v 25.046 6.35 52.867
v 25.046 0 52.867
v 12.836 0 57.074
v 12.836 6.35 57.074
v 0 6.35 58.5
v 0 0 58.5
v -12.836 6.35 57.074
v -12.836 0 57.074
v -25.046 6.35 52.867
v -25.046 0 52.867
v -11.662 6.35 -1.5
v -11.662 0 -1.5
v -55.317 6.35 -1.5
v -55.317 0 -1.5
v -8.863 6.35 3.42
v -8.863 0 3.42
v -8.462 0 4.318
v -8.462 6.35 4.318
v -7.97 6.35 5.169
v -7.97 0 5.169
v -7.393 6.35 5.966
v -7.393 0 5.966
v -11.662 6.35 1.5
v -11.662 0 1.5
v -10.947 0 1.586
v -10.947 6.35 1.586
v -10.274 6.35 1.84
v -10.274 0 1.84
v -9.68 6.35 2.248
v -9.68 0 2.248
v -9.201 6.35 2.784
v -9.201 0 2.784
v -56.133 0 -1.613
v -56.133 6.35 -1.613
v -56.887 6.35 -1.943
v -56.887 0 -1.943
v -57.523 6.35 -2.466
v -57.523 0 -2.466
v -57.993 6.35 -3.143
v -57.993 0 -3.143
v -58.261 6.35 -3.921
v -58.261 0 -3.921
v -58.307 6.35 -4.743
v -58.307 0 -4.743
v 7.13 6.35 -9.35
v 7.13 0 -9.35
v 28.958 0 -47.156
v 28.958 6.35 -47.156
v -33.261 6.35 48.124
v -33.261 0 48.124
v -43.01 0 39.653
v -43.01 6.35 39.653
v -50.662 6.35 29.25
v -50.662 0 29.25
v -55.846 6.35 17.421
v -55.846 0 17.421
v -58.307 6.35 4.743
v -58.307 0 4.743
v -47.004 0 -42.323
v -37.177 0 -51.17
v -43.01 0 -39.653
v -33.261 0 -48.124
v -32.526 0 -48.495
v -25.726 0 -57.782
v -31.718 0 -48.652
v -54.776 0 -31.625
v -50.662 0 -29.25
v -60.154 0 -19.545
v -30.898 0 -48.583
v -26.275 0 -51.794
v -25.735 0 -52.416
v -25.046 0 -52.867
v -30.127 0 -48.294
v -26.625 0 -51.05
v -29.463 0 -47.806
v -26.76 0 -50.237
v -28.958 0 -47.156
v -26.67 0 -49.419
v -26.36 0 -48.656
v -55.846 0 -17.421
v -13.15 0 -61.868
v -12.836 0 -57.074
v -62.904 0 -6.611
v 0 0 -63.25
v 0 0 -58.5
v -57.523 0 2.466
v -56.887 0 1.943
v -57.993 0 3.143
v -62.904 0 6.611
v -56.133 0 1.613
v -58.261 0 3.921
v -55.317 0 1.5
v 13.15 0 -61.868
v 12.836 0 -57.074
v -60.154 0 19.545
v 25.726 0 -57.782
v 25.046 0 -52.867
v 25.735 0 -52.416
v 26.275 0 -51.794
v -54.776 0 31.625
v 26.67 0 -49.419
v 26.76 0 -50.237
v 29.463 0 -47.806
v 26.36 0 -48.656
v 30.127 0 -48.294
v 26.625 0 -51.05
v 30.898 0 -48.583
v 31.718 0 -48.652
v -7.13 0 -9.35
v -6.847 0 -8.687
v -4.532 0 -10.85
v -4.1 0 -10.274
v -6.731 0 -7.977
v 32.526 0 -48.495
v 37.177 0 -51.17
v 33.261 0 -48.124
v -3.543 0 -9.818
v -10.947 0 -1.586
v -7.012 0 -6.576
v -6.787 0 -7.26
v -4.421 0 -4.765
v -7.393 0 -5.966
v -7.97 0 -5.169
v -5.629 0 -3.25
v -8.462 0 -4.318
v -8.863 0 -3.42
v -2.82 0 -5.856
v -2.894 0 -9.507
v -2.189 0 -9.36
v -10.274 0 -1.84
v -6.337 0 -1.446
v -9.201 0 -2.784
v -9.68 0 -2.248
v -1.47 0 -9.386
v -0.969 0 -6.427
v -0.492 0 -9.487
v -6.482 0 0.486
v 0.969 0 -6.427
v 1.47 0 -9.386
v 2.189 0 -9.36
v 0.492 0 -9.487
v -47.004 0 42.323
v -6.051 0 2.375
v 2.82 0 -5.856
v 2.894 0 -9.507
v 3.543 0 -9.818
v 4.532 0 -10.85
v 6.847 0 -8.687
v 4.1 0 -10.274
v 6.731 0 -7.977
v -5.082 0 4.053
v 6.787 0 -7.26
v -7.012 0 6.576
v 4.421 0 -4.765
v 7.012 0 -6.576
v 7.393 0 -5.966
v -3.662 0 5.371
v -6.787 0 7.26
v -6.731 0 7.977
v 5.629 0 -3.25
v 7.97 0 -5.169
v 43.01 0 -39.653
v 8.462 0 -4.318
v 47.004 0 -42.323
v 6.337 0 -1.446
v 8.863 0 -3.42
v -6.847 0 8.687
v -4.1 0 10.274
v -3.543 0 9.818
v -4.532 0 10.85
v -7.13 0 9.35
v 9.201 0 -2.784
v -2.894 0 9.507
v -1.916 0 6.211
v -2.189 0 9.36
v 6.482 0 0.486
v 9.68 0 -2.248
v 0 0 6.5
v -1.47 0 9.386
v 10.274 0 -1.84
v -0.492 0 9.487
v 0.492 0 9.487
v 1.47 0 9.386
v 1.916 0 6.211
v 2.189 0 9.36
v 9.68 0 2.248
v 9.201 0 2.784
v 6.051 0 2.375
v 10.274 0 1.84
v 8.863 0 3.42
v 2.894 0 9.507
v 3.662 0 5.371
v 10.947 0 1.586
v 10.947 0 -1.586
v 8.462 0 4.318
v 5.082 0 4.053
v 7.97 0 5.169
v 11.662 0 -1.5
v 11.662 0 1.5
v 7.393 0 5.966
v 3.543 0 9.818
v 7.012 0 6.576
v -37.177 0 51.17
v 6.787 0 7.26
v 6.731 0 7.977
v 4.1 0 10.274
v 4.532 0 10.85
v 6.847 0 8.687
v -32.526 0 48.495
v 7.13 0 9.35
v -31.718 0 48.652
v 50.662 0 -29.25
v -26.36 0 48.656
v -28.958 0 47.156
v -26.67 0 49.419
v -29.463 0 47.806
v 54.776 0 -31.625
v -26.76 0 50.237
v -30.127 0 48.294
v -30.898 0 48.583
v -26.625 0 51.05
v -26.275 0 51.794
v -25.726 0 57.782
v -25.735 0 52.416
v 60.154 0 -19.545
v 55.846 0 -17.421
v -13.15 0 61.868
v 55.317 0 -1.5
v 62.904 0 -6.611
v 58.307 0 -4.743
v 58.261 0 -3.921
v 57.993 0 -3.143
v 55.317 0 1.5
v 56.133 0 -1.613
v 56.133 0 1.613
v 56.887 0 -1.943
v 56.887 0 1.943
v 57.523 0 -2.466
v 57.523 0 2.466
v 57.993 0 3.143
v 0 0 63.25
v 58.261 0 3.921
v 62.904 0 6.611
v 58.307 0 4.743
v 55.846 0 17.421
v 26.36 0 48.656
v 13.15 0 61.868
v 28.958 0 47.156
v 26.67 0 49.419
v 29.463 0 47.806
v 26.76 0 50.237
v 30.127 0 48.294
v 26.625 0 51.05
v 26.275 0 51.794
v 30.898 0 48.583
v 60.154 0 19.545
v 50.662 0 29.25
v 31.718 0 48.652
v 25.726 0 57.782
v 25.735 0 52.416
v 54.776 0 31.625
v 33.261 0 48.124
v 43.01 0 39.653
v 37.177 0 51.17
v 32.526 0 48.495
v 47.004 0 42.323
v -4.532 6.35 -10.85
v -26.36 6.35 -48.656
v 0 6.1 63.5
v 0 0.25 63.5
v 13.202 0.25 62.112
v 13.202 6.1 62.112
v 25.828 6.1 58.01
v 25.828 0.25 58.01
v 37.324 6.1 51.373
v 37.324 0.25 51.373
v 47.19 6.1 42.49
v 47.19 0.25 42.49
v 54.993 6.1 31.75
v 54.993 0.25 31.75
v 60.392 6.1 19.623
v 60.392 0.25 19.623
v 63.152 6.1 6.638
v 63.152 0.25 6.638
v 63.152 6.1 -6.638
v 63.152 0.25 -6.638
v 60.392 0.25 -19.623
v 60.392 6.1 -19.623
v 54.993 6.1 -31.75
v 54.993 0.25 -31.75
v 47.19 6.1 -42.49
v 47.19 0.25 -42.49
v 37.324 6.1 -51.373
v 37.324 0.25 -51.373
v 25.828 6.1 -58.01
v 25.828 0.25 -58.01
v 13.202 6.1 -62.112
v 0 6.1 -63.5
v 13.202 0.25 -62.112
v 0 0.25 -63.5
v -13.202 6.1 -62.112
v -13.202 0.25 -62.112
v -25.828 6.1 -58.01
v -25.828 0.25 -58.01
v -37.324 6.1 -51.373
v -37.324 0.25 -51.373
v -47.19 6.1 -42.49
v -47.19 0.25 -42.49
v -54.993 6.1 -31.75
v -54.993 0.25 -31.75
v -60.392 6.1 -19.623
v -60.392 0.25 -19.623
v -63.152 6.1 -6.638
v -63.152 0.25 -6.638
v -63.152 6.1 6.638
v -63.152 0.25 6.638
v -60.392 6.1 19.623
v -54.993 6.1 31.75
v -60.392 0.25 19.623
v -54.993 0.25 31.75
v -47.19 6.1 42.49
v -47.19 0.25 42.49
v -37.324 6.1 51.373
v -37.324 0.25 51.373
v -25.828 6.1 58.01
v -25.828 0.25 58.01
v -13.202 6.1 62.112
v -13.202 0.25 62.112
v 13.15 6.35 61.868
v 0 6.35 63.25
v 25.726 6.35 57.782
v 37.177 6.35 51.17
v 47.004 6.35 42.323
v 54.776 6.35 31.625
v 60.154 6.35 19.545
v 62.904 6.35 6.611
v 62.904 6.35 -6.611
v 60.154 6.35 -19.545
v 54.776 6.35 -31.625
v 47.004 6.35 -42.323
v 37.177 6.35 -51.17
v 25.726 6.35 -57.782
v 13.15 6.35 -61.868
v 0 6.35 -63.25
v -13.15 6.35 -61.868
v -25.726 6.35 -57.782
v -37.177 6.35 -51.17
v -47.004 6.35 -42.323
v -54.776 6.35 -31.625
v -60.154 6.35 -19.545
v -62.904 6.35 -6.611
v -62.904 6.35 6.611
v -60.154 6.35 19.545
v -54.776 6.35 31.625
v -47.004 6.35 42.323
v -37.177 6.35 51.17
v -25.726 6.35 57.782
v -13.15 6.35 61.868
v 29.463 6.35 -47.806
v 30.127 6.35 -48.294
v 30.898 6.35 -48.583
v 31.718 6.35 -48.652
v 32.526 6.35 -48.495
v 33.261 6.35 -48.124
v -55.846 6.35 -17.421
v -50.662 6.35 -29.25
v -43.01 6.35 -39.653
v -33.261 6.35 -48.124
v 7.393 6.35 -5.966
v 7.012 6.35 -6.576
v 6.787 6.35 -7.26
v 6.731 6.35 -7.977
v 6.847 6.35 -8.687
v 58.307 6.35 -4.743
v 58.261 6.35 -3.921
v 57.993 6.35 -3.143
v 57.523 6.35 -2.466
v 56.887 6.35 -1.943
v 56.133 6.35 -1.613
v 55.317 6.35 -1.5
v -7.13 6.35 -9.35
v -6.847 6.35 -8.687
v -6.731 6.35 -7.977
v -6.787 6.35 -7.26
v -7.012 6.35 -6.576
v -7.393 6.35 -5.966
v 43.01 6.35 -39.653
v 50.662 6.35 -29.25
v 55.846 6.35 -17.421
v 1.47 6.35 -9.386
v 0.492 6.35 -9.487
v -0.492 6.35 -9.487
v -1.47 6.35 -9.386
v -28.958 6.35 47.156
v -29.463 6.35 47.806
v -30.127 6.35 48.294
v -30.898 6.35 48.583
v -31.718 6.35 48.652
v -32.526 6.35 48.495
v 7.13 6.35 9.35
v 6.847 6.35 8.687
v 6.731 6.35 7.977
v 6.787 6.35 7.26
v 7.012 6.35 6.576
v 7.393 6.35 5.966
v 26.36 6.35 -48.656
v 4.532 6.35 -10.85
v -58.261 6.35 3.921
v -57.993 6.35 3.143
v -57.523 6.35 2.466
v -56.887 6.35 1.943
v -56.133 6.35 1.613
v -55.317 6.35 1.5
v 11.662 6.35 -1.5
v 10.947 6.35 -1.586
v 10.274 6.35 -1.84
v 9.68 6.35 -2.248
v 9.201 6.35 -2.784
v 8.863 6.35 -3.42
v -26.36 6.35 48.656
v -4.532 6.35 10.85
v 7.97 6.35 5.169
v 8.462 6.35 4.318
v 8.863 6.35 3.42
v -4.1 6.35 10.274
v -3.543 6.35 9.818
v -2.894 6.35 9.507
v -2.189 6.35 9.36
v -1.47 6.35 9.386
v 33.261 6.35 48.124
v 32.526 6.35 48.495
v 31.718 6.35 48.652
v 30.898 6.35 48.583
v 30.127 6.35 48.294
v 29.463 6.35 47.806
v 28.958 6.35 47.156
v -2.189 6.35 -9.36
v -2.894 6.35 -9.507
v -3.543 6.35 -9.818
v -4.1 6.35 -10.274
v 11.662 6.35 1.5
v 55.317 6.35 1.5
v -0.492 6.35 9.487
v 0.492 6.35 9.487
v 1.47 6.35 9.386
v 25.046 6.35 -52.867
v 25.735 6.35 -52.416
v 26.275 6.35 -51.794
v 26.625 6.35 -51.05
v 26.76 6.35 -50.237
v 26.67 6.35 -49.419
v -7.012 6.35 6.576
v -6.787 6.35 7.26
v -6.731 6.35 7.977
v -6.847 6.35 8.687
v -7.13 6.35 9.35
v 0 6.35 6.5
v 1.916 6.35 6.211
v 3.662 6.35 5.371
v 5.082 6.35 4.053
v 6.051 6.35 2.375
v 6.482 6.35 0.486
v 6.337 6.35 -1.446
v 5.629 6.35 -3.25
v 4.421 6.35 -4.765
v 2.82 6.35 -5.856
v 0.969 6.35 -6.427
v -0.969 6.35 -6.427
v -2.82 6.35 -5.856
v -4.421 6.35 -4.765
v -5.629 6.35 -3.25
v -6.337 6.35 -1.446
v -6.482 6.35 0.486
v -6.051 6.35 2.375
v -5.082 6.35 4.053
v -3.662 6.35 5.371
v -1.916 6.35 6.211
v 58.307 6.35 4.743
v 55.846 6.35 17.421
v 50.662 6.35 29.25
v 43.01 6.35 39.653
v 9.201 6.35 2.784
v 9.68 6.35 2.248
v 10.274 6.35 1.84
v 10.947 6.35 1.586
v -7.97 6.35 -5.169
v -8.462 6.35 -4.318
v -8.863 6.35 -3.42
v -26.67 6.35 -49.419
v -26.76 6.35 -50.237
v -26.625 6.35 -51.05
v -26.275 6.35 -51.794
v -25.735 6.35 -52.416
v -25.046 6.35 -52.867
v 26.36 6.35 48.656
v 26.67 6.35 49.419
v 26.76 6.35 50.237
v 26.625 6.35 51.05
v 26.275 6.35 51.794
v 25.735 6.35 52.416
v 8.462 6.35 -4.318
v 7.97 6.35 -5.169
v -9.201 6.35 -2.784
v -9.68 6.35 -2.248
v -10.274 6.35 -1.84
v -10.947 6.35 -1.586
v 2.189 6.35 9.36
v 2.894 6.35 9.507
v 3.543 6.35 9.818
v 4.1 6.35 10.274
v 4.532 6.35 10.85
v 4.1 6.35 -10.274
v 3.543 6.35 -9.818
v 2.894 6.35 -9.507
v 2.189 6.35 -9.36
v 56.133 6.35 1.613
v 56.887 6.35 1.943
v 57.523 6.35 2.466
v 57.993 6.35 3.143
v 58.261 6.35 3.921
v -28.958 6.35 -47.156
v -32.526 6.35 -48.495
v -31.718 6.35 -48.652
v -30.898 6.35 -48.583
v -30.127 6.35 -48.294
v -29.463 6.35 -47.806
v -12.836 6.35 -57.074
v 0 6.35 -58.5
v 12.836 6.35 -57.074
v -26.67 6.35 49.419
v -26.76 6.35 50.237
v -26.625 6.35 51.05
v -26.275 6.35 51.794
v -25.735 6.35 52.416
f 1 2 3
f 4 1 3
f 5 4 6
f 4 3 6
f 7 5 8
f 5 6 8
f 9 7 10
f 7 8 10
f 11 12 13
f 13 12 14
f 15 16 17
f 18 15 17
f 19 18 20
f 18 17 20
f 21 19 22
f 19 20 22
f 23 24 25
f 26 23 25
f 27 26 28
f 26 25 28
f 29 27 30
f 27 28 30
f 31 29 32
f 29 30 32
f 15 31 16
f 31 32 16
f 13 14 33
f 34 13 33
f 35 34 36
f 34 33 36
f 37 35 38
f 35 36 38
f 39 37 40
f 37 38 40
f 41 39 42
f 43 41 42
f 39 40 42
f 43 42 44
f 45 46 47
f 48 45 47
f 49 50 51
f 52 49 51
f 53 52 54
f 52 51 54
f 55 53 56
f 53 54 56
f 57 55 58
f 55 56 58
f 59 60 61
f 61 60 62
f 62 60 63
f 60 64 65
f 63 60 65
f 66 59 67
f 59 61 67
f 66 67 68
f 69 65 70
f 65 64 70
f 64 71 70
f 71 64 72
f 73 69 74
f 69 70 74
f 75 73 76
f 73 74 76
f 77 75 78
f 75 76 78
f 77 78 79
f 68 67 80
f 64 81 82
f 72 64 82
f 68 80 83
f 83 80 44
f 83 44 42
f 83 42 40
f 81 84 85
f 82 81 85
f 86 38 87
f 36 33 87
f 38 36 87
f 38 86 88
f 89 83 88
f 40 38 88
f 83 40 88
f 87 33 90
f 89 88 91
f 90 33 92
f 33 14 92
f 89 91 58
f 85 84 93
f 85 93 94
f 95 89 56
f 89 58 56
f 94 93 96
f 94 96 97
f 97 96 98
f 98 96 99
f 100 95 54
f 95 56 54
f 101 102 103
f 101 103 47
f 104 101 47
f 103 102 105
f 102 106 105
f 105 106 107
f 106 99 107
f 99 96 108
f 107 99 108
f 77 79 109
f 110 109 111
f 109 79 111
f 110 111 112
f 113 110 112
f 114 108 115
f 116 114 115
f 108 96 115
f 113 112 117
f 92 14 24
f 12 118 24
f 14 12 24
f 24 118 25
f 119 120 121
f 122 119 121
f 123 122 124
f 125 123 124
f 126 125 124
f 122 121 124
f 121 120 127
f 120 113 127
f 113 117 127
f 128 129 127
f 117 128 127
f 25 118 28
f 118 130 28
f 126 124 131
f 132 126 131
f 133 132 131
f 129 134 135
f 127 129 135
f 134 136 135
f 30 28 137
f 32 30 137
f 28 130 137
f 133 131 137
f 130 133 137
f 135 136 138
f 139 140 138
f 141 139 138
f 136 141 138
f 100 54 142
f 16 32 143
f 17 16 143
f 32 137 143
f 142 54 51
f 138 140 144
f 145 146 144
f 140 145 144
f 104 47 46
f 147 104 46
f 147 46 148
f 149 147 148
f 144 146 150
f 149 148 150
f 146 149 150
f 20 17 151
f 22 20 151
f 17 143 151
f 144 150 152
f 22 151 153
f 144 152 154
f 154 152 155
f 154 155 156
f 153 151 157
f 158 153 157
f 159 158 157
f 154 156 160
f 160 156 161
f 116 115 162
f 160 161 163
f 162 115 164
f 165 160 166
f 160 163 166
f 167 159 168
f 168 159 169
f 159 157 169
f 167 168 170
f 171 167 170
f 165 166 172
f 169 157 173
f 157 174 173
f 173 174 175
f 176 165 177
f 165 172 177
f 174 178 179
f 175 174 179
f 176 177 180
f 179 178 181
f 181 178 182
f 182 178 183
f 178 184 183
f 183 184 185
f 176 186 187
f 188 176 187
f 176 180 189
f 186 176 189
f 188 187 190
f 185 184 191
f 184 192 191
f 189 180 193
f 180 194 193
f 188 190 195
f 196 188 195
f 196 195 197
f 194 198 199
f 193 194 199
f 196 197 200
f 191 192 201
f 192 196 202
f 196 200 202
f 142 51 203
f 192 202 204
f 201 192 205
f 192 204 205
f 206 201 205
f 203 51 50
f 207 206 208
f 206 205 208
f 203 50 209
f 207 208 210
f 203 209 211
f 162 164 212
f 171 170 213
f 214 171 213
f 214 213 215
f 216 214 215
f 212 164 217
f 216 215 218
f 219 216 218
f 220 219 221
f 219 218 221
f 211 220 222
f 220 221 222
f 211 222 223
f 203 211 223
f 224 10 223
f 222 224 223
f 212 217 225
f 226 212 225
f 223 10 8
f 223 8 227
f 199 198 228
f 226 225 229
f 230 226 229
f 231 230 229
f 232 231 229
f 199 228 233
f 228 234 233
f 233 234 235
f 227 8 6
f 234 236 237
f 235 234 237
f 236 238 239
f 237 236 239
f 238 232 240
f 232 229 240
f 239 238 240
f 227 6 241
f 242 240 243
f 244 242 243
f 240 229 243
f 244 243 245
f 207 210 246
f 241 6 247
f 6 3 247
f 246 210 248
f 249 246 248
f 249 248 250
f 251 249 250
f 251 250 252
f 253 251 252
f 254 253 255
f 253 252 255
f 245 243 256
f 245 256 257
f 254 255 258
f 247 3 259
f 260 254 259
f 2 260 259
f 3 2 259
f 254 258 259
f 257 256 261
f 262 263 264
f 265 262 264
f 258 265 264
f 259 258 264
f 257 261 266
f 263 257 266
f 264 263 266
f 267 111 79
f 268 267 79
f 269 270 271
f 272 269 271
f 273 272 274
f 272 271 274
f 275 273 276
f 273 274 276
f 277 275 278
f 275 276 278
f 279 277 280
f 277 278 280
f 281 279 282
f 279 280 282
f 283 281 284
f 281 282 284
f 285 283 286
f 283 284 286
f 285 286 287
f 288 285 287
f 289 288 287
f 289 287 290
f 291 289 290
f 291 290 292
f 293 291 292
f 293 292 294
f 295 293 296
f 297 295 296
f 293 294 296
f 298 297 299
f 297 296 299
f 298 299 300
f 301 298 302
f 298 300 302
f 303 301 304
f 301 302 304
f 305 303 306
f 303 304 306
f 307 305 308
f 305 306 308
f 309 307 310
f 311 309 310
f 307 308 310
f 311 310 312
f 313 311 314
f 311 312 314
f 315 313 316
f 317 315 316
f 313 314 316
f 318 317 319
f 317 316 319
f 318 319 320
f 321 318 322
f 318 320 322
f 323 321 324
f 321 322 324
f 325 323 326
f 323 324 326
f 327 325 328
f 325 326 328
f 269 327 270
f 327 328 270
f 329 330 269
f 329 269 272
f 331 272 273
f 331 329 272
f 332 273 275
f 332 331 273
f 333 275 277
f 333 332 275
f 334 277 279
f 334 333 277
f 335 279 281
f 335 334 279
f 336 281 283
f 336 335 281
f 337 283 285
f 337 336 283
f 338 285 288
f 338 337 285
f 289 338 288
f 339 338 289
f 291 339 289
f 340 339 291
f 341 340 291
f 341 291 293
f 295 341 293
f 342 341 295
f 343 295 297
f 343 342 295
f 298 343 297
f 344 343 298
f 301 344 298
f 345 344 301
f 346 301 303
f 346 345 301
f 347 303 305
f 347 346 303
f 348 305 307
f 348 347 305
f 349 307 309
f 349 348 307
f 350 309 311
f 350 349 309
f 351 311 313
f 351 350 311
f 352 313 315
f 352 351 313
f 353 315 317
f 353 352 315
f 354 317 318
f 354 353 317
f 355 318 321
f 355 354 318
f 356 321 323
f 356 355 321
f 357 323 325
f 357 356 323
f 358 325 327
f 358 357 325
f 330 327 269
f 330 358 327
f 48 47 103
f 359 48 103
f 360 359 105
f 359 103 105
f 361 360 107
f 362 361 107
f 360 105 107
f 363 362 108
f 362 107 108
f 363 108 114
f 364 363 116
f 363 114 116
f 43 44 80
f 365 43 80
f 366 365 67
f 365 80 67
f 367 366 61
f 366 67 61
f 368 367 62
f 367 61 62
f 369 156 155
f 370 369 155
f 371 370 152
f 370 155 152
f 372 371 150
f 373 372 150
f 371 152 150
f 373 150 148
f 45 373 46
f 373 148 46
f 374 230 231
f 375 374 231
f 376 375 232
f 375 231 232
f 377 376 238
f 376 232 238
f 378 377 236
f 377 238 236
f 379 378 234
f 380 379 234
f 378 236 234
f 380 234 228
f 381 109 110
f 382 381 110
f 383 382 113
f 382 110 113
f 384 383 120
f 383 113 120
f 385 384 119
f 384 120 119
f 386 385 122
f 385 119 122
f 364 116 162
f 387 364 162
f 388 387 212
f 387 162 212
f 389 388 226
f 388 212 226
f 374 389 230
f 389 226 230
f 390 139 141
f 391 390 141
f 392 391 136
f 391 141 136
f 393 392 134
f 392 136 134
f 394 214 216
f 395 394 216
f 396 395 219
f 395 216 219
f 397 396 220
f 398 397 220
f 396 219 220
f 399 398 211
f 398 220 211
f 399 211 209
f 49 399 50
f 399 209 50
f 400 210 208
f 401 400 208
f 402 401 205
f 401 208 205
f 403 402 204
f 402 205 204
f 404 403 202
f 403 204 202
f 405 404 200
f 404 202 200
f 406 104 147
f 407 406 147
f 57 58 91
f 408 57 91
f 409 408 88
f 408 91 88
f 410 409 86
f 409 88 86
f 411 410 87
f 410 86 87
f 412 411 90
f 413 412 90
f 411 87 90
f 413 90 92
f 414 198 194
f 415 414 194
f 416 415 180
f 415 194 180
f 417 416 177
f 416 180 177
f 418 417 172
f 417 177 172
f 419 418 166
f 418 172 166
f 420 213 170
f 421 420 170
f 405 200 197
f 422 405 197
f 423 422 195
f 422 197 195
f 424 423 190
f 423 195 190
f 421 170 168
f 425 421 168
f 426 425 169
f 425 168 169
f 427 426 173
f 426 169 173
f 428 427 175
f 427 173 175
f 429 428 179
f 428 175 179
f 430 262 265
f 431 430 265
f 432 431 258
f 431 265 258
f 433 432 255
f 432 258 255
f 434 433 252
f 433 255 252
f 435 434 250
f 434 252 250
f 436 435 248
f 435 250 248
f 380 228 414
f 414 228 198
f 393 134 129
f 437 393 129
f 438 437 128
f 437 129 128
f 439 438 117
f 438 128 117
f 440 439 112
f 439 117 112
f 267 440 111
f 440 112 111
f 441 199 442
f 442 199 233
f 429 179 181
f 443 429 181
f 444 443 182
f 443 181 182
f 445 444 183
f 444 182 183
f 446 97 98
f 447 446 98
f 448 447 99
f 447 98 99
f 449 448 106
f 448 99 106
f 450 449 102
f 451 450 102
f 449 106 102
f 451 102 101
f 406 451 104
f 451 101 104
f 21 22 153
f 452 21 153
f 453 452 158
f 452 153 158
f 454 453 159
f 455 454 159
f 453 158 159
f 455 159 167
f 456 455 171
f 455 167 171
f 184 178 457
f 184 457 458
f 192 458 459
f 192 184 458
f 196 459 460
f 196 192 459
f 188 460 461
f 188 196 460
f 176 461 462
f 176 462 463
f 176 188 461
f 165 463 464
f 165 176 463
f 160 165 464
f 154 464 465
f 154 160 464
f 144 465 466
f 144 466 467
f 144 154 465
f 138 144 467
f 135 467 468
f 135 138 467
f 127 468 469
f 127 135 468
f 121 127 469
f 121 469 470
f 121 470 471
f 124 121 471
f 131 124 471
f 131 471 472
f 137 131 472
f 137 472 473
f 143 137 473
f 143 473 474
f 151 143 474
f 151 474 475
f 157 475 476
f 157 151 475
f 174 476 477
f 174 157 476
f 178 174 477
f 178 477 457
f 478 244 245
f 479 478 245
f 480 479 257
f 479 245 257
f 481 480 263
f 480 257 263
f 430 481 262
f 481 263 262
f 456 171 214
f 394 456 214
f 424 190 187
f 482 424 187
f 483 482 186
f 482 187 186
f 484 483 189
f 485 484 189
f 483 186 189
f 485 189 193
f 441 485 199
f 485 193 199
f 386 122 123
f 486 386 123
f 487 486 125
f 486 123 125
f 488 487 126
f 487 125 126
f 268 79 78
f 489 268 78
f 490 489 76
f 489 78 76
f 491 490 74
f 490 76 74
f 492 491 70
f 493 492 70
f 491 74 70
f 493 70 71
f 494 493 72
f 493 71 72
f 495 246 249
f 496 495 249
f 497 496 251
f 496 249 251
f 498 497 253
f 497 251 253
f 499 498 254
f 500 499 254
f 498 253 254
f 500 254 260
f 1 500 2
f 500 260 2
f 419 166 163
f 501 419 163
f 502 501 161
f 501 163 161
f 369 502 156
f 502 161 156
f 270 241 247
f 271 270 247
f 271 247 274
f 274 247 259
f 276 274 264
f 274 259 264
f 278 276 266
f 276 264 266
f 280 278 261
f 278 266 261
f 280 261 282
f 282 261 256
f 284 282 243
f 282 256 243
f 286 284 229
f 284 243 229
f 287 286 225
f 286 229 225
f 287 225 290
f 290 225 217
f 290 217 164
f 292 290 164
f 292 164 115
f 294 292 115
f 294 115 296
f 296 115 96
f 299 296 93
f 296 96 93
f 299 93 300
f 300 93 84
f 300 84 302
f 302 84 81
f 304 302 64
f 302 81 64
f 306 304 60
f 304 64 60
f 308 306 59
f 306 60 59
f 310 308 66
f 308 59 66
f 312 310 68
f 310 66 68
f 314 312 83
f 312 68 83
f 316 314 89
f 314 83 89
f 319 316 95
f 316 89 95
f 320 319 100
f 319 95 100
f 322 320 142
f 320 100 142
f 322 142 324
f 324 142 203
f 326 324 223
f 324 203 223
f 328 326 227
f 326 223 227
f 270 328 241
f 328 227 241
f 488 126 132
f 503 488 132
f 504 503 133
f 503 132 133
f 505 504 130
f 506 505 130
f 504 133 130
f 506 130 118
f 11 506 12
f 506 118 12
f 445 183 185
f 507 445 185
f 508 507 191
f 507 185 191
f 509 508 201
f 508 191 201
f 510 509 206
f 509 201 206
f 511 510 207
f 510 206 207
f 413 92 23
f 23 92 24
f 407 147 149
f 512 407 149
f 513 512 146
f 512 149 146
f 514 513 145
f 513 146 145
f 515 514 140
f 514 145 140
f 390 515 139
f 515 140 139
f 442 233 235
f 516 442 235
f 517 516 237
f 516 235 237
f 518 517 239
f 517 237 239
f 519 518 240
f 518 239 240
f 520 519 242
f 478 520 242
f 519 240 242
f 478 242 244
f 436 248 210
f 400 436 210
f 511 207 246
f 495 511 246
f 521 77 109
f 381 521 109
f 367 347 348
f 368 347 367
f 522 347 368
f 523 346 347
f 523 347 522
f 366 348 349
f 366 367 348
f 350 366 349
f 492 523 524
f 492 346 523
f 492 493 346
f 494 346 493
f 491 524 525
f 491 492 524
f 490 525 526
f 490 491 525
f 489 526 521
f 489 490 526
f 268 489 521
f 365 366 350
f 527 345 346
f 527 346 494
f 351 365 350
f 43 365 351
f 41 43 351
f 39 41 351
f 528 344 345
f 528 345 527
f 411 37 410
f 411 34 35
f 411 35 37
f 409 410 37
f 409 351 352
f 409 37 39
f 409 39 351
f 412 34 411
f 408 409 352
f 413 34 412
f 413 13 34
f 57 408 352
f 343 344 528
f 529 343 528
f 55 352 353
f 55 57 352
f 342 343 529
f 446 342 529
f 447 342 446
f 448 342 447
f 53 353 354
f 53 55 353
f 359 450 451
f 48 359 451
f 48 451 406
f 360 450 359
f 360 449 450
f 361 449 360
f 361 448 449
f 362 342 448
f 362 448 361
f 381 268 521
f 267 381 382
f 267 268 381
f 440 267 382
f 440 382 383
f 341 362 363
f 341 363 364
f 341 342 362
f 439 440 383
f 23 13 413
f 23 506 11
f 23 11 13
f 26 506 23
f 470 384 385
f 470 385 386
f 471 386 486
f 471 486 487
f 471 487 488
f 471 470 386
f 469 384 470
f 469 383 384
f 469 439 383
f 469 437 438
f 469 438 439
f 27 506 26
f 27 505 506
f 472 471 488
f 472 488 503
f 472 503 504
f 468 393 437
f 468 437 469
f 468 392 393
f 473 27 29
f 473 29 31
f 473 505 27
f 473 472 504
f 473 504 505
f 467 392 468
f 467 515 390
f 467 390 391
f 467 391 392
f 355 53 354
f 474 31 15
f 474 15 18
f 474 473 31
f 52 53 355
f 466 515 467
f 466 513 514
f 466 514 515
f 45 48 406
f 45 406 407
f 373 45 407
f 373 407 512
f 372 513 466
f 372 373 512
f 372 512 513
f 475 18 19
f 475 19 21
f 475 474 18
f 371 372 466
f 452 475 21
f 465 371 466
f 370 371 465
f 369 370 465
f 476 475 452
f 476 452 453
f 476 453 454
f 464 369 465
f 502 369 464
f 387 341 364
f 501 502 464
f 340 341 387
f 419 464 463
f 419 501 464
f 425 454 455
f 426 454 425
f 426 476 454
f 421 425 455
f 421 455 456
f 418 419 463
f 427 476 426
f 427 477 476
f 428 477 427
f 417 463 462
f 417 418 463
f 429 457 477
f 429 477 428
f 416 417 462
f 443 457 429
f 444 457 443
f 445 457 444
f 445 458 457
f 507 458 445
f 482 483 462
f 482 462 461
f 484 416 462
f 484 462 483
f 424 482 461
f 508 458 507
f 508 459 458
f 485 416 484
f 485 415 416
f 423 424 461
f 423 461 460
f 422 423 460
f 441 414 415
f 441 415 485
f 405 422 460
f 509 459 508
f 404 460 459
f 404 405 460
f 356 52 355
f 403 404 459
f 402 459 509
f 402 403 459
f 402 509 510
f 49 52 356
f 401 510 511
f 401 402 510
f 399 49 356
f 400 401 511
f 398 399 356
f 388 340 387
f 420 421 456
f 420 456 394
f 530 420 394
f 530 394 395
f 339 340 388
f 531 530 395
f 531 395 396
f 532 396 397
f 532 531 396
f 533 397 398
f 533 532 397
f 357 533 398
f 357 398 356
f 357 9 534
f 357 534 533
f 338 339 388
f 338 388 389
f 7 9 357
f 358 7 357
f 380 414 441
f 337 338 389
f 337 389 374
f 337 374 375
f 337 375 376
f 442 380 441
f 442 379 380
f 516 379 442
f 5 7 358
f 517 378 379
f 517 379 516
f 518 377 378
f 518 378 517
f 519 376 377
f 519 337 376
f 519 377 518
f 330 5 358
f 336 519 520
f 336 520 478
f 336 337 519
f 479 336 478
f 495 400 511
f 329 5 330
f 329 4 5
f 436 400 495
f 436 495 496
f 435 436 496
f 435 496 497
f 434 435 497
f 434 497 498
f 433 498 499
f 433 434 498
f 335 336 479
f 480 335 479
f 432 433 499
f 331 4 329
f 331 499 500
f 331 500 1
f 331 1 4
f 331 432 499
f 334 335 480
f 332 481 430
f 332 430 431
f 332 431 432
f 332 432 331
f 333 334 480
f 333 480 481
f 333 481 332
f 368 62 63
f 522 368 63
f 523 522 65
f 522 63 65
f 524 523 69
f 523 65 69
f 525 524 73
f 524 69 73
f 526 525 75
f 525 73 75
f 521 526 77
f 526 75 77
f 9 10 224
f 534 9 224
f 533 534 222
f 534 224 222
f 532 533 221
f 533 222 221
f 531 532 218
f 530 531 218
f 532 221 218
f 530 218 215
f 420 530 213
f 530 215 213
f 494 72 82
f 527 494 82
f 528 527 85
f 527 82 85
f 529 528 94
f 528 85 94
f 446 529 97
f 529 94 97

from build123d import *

# Parameters (mm, degrees)
SKETCH1_R           = 63.5
SKETCH1_R_2         = 6.5
BOSS_EXTRUDE3_DEPTH = 6.35
CHAMFER2_SIZE       = 0.25


with BuildPart() as part:
    # Sketch1 → Boss-Extrude3 (new body)
    with BuildSketch(Plane(origin=(0, 0, 0), x_dir=(1, 0, 0), z_dir=(0, 1, 0))):
        Circle(SKETCH1_R)
        Circle(SKETCH1_R_2, mode=Mode.SUBTRACT)
        with BuildLine():
            Line((-4.531913789, 10.849504938), (-26.359595266, 48.656158268))
            ThreePointArc((-26.359595266, 48.656158268), (-26.62540639, 51.049550304), (-25.04592549, 52.867301958))
            ThreePointArc((-25.04592549, 52.867301958), (0, 58.5), (25.04592549, 52.867301958))
            ThreePointArc((25.04592549, 52.867301958), (26.62540639, 51.049550304), (26.359595266, 48.656158268))
            Line((26.359595266, 48.656158268), (4.531913789, 10.849504938))
            ThreePointArc((4.531913789, 10.849504938), (3.227737969, 9.642879405), (1.469716559, 9.385623753))
            ThreePointArc((1.469716559, 9.385623753), (0, 9.5), (-1.469716559, 9.385623753))
            ThreePointArc((-1.469716559, 9.385623753), (-3.227737969, 9.642879405), (-4.531913789, 10.849504938))
        make_face(mode=Mode.SUBTRACT)
        with BuildLine():
            Line((7.129990001, 9.349504938), (28.957671478, 47.156158268))
            ThreePointArc((28.957671478, 47.156158268), (30.89750422, 48.583053472), (33.26146378, 48.124058715))
            ThreePointArc((33.26146378, 48.124058715), (50.662486121, 29.25), (58.30738927, 4.743243243))
            ThreePointArc((58.30738927, 4.743243243), (57.52291061, 2.466496832), (55.317266744, 1.5))
            Line((55.317266744, 1.5), (11.66190379, 1.5))
            ThreePointArc((11.66190379, 1.5), (9.964847515, 2.026136625), (8.86304688, 3.42))
            ThreePointArc((8.86304688, 3.42), (8.227241336, 4.75), (7.393330321, 5.965623753))
            ThreePointArc((7.393330321, 5.965623753), (6.737109546, 7.61674278), (7.129990001, 9.349504938))
        make_face(mode=Mode.SUBTRACT)
        with BuildLine():
            Line((11.66190379, -1.5), (55.317266744, -1.5))
            ThreePointArc((55.317266744, -1.5), (57.52291061, -2.466496832), (58.30738927, -4.743243243))
            ThreePointArc((58.30738927, -4.743243243), (50.662486121, -29.25), (33.26146378, -48.124058715))
            ThreePointArc((33.26146378, -48.124058715), (30.89750422, -48.583053472), (28.957671478, -47.156158268))
            Line((28.957671478, -47.156158268), (7.129990001, -9.349504938))
            ThreePointArc((7.129990001, -9.349504938), (6.737109546, -7.61674278), (7.393330321, -5.965623753))
            ThreePointArc((7.393330321, -5.965623753), (8.227241336, -4.75), (8.86304688, -3.42))
            ThreePointArc((8.86304688, -3.42), (9.964847515, -2.026136625), (11.66190379, -1.5))
        make_face(mode=Mode.SUBTRACT)
        with BuildLine():
            Line((4.531913789, -10.849504938), (26.359595266, -48.656158268))
            ThreePointArc((26.359595266, -48.656158268), (26.62540639, -51.049550304), (25.04592549, -52.867301958))
            ThreePointArc((25.04592549, -52.867301958), (0, -58.5), (-25.04592549, -52.867301958))
            ThreePointArc((-25.04592549, -52.867301958), (-26.62540639, -51.049550304), (-26.359595266, -48.656158268))
            Line((-26.359595266, -48.656158268), (-4.531913789, -10.849504938))
            ThreePointArc((-4.531913789, -10.849504938), (-3.227737969, -9.642879405), (-1.469716559, -9.385623753))
            ThreePointArc((-1.469716559, -9.385623753), (0, -9.5), (1.469716559, -9.385623753))
            ThreePointArc((1.469716559, -9.385623753), (3.227737969, -9.642879405), (4.531913789, -10.849504938))
        make_face(mode=Mode.SUBTRACT)
        with BuildLine():
            Line((-7.129990001, -9.349504938), (-28.957671478, -47.156158268))
            ThreePointArc((-28.957671478, -47.156158268), (-30.89750422, -48.583053472), (-33.26146378, -48.124058715))
            ThreePointArc((-33.26146378, -48.124058715), (-50.662486121, -29.25), (-58.30738927, -4.743243243))
            ThreePointArc((-58.30738927, -4.743243243), (-57.52291061, -2.466496832), (-55.317266744, -1.5))
            Line((-55.317266744, -1.5), (-11.66190379, -1.5))
            ThreePointArc((-11.66190379, -1.5), (-9.964847515, -2.026136625), (-8.86304688, -3.42))
            ThreePointArc((-8.86304688, -3.42), (-8.227241336, -4.75), (-7.393330321, -5.965623753))
            ThreePointArc((-7.393330321, -5.965623753), (-6.737109546, -7.61674278), (-7.129990001, -9.349504938))
        make_face(mode=Mode.SUBTRACT)
        with BuildLine():
            Line((-11.66190379, 1.5), (-55.317266744, 1.5))
            ThreePointArc((-55.317266744, 1.5), (-57.52291061, 2.466496832), (-58.30738927, 4.743243243))
            ThreePointArc((-58.30738927, 4.743243243), (-50.662486121, 29.25), (-33.26146378, 48.124058715))
            ThreePointArc((-33.26146378, 48.124058715), (-30.89750422, 48.583053472), (-28.957671478, 47.156158268))
            Line((-28.957671478, 47.156158268), (-7.129990001, 9.349504938))
            ThreePointArc((-7.129990001, 9.349504938), (-6.737109546, 7.61674278), (-7.393330321, 5.965623753))
            ThreePointArc((-7.393330321, 5.965623753), (-8.227241336, 4.75), (-8.86304688, 3.42))
            ThreePointArc((-8.86304688, 3.42), (-9.964847515, 2.026136625), (-11.66190379, 1.5))
        make_face(mode=Mode.SUBTRACT)
    extrude(amount=BOSS_EXTRUDE3_DEPTH)

    # Chamfer2
    chamfer2_edges = [part.edges().sort_by_distance(p)[0] for p in [
        (-63.5, 6.35, 0),
        (-63.5, 6.35, 0),
        (-63.5, 6.35, 0),
        (-63.5, 6.35, 0),
        (-63.5, 0, 0),
        (-63.5, 0, 0),
        (-63.5, 0, 0),
        (-63.5, 0, 0),
    ]]
    chamfer(chamfer2_edges, length=CHAMFER2_SIZE)


solid = part.part
